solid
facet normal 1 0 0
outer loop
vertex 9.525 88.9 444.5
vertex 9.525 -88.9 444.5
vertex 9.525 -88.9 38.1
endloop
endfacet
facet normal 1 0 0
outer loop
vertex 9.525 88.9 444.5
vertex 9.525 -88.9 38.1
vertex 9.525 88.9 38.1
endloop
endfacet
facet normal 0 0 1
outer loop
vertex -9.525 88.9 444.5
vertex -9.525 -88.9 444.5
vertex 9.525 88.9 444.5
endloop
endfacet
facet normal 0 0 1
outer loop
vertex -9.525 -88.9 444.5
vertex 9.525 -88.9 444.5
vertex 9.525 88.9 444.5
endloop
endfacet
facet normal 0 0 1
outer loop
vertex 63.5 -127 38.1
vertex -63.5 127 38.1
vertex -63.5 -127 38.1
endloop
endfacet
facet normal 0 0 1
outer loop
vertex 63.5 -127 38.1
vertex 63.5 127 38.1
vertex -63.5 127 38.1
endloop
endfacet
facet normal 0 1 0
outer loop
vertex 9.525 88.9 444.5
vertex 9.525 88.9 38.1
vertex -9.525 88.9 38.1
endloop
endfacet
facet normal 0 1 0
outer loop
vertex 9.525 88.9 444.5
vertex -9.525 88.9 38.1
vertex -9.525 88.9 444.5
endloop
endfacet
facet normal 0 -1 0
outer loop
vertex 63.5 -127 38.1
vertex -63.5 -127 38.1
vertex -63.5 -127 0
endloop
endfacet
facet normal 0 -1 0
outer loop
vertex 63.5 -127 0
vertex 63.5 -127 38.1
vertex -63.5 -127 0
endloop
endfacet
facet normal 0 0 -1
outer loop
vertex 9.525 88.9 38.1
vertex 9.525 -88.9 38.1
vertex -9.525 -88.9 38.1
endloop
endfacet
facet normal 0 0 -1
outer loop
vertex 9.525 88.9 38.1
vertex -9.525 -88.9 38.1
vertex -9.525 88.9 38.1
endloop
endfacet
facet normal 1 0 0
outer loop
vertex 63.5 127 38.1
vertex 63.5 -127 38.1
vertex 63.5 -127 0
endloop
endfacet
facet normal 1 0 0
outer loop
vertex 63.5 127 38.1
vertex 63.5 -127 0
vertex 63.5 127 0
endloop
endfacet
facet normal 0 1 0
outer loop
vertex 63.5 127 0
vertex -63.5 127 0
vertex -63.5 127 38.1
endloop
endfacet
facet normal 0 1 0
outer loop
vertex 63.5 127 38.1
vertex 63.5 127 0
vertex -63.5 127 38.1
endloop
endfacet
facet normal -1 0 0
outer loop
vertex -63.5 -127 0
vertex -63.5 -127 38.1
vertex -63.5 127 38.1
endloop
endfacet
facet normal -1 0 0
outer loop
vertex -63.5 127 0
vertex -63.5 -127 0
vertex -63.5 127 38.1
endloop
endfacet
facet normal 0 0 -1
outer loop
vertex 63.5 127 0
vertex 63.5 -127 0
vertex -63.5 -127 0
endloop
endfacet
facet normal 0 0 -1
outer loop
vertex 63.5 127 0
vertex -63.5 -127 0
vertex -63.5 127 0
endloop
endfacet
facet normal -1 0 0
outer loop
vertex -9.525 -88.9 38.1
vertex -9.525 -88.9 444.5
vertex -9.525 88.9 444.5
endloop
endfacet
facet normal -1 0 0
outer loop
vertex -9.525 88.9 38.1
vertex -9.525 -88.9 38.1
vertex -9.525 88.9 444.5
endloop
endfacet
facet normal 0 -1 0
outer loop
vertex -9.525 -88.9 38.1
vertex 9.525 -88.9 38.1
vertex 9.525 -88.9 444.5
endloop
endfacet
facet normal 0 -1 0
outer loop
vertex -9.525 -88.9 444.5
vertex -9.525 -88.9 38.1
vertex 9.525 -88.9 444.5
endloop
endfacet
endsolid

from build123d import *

# Parameters (mm, degrees)
F0_W     = 177.8
F0_H     = 406.4
F0_W_2   = 76.2
F0_H_2   = 304.8
F1_DEPTH = 9.525
F2_DEPTH = 63.5


with BuildPart() as f1:
    # F0 (on Right) → F1 (new body, symmetric)
    with BuildSketch(Plane.YZ):
        with Locations((0, 241.3)):
            Rectangle(F0_W, F0_H)
        with Locations((0, 241.3)):
            Rectangle(F0_W_2, F0_H_2, mode=Mode.SUBTRACT)
        with Locations((0, 241.3)):
            Rectangle(F0_W_2, F0_H_2)
    extrude(amount=F1_DEPTH, both=True)


with BuildPart() as f2:
    # F0 (on Right) → F2 (new body, symmetric)
    with BuildSketch(Plane.YZ):
        Polygon((127, 38.1), (88.9, 38.1), (-88.9, 38.1), (-127, 38.1), (-127, 0), (127, 0), align=None)
    extrude(amount=F2_DEPTH, both=True)


solid = Compound([f1.part, f2.part])
